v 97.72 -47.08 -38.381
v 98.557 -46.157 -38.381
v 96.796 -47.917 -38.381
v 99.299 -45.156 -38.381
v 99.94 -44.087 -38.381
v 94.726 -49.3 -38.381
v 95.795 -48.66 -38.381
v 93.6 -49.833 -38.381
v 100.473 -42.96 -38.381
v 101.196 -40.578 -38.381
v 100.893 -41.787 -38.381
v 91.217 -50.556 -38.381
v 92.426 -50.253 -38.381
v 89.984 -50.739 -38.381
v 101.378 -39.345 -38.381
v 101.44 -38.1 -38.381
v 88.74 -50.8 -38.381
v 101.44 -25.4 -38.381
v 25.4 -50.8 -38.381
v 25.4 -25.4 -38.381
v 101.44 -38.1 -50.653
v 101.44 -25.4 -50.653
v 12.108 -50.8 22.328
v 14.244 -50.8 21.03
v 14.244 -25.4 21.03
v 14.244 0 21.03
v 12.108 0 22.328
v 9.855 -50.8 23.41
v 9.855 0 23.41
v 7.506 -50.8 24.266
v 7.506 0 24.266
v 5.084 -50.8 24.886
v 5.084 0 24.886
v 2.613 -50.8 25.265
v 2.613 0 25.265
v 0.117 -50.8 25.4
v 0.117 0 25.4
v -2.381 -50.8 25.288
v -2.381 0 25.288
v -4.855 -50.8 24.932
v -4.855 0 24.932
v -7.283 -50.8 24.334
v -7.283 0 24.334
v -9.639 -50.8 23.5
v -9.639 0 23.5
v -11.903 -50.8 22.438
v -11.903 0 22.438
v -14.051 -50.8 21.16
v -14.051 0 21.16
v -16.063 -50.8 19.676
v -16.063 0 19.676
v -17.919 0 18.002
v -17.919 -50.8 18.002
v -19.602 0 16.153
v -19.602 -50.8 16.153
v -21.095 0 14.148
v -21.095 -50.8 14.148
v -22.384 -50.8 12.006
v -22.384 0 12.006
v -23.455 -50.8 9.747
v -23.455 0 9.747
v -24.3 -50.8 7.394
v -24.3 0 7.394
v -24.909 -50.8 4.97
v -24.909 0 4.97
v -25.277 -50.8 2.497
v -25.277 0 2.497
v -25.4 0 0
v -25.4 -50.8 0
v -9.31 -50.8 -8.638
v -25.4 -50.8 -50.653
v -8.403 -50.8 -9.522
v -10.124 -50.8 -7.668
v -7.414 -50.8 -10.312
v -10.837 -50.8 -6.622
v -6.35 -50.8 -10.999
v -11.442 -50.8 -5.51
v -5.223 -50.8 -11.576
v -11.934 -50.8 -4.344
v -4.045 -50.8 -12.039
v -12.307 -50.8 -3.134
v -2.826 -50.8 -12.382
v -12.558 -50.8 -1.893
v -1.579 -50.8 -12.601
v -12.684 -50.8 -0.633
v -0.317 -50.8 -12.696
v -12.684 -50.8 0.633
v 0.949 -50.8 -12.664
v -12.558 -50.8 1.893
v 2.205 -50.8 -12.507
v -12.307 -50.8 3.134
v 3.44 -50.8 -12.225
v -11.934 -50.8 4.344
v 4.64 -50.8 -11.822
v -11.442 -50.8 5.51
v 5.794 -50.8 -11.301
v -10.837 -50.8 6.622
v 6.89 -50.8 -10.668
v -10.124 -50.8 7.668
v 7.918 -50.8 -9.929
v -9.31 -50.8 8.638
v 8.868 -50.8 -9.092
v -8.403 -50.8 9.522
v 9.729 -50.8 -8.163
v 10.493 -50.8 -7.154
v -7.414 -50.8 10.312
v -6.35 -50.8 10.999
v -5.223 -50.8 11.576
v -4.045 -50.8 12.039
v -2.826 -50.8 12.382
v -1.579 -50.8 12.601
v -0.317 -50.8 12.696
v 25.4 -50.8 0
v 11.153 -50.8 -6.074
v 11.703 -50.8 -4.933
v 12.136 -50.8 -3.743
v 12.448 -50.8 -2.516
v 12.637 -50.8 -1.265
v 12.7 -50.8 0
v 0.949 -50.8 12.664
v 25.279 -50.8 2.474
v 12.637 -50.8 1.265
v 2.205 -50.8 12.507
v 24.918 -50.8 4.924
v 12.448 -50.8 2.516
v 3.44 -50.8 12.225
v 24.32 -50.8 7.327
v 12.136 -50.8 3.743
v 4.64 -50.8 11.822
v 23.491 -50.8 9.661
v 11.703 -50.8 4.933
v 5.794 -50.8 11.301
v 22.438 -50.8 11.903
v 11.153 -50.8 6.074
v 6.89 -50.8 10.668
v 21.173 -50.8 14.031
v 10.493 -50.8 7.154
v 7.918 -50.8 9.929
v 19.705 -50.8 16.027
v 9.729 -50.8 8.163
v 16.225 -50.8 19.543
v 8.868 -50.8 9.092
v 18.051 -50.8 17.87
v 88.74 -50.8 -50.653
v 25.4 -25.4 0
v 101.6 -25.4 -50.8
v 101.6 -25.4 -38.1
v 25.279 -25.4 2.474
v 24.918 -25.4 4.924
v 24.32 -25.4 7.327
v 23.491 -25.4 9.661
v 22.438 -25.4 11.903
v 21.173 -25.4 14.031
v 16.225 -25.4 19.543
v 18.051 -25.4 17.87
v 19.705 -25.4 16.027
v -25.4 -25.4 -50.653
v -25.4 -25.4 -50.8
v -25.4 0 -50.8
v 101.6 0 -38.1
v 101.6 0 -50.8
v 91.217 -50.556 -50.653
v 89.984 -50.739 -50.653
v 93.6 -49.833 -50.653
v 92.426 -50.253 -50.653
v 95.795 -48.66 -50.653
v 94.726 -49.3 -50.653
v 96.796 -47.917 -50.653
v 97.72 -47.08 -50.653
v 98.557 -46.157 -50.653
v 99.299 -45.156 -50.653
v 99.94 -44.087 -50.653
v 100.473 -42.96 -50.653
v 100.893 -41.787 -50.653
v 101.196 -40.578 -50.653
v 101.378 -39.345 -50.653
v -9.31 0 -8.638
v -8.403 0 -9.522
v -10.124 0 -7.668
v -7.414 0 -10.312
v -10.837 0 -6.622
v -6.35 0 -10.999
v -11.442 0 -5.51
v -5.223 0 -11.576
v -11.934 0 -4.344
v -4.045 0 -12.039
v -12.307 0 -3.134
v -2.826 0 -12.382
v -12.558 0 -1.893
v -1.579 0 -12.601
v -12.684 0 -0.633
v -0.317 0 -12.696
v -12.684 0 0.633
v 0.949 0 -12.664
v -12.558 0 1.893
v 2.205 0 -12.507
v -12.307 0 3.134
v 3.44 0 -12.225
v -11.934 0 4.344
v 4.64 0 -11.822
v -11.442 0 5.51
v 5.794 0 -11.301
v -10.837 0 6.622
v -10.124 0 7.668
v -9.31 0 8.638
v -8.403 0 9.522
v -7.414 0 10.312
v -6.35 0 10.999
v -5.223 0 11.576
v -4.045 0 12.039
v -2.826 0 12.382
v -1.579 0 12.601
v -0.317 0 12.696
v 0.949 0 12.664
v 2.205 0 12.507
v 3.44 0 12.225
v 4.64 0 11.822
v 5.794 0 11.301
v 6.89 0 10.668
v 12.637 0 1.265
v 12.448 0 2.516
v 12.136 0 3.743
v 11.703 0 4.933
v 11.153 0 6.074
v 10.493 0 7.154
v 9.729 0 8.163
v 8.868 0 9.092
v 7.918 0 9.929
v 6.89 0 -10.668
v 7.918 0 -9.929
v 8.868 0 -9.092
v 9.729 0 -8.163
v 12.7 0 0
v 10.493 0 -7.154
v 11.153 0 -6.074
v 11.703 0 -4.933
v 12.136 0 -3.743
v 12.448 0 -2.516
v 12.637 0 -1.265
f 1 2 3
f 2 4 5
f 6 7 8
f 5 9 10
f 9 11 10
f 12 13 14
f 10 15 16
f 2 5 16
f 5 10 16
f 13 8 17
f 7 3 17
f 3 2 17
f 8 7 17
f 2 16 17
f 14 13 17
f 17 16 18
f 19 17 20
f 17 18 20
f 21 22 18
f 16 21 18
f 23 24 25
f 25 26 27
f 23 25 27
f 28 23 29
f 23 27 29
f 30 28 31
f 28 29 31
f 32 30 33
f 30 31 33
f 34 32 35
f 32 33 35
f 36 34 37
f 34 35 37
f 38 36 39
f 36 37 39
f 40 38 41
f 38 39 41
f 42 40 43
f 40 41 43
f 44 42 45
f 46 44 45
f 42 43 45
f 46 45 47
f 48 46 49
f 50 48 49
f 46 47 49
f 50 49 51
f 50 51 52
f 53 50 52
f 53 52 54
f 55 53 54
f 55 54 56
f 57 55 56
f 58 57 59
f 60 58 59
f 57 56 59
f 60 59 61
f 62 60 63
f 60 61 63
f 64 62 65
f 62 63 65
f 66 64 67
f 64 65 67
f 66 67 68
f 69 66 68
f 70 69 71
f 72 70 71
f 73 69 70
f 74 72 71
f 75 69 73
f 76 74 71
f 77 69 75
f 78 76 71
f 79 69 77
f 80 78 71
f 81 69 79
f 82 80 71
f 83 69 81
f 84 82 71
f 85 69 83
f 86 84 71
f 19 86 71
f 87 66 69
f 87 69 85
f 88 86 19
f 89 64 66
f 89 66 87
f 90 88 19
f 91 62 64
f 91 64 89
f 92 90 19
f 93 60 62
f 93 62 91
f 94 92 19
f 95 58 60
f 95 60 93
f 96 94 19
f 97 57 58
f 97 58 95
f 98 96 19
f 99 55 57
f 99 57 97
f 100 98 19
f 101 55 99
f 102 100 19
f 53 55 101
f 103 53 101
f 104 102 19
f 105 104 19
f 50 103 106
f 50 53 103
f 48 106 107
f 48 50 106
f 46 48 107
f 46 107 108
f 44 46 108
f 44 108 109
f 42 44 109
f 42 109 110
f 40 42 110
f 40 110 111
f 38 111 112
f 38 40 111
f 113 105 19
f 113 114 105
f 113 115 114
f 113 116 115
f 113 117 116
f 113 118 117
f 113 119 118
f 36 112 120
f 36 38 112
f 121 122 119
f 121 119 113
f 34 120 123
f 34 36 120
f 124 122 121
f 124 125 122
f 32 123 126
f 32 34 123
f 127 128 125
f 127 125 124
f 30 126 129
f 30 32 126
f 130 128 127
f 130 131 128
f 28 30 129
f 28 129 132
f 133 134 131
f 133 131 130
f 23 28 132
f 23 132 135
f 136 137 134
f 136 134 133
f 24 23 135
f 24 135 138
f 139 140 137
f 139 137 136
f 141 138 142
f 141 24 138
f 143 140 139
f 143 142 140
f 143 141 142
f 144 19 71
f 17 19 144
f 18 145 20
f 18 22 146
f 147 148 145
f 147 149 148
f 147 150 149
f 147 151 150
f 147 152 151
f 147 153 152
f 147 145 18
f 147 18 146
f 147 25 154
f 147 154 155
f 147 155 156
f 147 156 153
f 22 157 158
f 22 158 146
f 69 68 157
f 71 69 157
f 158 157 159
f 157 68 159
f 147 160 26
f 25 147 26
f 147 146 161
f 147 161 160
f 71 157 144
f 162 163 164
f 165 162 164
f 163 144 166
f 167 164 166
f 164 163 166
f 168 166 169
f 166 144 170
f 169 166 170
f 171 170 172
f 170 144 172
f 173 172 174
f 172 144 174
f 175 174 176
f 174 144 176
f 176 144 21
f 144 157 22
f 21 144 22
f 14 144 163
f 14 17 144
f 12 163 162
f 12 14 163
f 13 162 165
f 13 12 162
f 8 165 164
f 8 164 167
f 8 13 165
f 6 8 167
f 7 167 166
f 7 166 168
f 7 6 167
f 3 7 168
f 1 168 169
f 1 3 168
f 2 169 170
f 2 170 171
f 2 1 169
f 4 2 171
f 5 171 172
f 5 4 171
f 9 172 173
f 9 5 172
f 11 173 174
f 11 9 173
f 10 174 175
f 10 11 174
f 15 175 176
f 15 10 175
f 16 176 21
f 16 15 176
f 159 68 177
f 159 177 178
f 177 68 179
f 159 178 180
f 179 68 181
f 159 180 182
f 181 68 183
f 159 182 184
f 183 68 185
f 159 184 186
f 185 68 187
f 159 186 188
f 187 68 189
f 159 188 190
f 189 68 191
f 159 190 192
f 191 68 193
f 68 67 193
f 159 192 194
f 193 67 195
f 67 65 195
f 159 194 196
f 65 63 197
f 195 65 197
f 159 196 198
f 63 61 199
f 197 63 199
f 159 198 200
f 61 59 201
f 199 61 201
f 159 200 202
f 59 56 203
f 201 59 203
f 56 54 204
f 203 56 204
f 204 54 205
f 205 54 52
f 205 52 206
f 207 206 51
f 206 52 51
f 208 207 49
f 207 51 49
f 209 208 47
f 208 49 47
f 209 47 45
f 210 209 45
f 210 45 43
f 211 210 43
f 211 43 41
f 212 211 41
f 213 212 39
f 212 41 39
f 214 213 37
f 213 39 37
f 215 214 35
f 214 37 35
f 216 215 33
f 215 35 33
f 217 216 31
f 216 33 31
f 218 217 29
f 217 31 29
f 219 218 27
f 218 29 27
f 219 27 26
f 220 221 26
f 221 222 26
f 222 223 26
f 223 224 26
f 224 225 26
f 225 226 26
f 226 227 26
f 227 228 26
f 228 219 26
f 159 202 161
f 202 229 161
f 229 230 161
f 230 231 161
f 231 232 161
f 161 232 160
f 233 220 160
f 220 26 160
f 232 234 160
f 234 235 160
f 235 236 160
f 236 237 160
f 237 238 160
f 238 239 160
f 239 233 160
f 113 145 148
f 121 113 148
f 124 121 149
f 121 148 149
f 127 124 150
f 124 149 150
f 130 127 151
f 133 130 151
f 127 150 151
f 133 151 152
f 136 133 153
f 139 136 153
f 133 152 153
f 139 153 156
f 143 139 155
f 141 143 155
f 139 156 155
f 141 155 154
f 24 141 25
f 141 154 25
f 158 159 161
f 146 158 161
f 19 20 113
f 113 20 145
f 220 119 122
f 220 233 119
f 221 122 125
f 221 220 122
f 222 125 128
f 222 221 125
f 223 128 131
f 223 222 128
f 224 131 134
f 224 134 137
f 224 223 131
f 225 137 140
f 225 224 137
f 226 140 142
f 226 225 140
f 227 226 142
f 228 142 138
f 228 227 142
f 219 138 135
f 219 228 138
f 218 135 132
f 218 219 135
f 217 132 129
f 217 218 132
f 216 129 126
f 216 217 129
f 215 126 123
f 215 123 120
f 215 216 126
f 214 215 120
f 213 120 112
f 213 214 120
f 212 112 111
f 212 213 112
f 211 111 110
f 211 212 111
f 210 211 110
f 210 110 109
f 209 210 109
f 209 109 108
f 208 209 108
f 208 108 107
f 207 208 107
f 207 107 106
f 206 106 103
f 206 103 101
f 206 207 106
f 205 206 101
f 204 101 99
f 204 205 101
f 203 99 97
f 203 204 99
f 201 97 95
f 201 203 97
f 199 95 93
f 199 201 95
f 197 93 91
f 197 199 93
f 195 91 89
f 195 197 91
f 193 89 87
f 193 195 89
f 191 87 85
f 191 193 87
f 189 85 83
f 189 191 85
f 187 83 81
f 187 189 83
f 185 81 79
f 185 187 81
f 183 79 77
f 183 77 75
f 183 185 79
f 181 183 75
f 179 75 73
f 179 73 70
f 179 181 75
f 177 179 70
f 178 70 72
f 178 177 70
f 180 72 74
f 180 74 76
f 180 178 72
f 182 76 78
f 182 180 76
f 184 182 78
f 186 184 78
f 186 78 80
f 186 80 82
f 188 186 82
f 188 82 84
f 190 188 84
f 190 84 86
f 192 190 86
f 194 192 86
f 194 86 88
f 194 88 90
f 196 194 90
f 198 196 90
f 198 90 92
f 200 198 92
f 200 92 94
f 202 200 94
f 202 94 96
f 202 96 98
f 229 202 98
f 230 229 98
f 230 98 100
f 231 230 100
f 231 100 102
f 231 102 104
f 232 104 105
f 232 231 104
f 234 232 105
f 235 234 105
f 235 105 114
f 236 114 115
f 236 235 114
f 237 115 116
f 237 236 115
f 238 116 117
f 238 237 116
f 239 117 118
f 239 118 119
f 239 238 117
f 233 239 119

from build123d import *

# Parameters (mm, degrees)
F0_R     = 12.7
F1_DEPTH = 25.4
F2_R     = 12.7
F3_DEPTH = 25.4
F4_R     = 12.7


with BuildPart() as f1:
    # F0 (on Front) → F1 (new body)
    with BuildSketch(Plane.XZ):
        with BuildLine():
            Line((101.6, -38.1), (14.244434, 21.029886))
            ThreePointArc((14.244434, 21.029886), (-11.90276, 22.438456), (-25.4, 0))
            Line((-25.4, 0), (-25.4, -50.8))
            Line((-25.4, -50.8), (101.6, -50.8))
            Line((101.6, -50.8), (101.6, -38.1))
        make_face()
        Circle(F0_R, mode=Mode.SUBTRACT)
    extrude(amount=F1_DEPTH)

    # F2 (on face) → F3 (join)
    with BuildSketch(Plane.XZ.offset(25.4)):
        with BuildLine():
            Line((25.4, -38.380738), (25.4, 0))
            ThreePointArc((25.4, 0), (22.438456, 11.90276), (14.244434, 21.029886))
            ThreePointArc((14.244434, 21.029886), (-11.90276, 22.438456), (-25.4, 0))
            Line((-25.4, 0), (-25.4, -50.652947))
            Line((-25.4, -50.652947), (101.439578, -50.652947))
            Line((101.439578, -50.652947), (101.439578, -38.380738))
            Line((101.439578, -38.380738), (25.4, -38.380738))
        make_face()
        Circle(F2_R, mode=Mode.SUBTRACT)
    extrude(amount=F3_DEPTH)

    # F4
    f4_edges = [f1.edges().sort_by_distance(p)[0] for p in [
        (101.439578, -50.8, -44.516843),
    ]]
    fillet(f4_edges, radius=F4_R)


solid = f1.part
